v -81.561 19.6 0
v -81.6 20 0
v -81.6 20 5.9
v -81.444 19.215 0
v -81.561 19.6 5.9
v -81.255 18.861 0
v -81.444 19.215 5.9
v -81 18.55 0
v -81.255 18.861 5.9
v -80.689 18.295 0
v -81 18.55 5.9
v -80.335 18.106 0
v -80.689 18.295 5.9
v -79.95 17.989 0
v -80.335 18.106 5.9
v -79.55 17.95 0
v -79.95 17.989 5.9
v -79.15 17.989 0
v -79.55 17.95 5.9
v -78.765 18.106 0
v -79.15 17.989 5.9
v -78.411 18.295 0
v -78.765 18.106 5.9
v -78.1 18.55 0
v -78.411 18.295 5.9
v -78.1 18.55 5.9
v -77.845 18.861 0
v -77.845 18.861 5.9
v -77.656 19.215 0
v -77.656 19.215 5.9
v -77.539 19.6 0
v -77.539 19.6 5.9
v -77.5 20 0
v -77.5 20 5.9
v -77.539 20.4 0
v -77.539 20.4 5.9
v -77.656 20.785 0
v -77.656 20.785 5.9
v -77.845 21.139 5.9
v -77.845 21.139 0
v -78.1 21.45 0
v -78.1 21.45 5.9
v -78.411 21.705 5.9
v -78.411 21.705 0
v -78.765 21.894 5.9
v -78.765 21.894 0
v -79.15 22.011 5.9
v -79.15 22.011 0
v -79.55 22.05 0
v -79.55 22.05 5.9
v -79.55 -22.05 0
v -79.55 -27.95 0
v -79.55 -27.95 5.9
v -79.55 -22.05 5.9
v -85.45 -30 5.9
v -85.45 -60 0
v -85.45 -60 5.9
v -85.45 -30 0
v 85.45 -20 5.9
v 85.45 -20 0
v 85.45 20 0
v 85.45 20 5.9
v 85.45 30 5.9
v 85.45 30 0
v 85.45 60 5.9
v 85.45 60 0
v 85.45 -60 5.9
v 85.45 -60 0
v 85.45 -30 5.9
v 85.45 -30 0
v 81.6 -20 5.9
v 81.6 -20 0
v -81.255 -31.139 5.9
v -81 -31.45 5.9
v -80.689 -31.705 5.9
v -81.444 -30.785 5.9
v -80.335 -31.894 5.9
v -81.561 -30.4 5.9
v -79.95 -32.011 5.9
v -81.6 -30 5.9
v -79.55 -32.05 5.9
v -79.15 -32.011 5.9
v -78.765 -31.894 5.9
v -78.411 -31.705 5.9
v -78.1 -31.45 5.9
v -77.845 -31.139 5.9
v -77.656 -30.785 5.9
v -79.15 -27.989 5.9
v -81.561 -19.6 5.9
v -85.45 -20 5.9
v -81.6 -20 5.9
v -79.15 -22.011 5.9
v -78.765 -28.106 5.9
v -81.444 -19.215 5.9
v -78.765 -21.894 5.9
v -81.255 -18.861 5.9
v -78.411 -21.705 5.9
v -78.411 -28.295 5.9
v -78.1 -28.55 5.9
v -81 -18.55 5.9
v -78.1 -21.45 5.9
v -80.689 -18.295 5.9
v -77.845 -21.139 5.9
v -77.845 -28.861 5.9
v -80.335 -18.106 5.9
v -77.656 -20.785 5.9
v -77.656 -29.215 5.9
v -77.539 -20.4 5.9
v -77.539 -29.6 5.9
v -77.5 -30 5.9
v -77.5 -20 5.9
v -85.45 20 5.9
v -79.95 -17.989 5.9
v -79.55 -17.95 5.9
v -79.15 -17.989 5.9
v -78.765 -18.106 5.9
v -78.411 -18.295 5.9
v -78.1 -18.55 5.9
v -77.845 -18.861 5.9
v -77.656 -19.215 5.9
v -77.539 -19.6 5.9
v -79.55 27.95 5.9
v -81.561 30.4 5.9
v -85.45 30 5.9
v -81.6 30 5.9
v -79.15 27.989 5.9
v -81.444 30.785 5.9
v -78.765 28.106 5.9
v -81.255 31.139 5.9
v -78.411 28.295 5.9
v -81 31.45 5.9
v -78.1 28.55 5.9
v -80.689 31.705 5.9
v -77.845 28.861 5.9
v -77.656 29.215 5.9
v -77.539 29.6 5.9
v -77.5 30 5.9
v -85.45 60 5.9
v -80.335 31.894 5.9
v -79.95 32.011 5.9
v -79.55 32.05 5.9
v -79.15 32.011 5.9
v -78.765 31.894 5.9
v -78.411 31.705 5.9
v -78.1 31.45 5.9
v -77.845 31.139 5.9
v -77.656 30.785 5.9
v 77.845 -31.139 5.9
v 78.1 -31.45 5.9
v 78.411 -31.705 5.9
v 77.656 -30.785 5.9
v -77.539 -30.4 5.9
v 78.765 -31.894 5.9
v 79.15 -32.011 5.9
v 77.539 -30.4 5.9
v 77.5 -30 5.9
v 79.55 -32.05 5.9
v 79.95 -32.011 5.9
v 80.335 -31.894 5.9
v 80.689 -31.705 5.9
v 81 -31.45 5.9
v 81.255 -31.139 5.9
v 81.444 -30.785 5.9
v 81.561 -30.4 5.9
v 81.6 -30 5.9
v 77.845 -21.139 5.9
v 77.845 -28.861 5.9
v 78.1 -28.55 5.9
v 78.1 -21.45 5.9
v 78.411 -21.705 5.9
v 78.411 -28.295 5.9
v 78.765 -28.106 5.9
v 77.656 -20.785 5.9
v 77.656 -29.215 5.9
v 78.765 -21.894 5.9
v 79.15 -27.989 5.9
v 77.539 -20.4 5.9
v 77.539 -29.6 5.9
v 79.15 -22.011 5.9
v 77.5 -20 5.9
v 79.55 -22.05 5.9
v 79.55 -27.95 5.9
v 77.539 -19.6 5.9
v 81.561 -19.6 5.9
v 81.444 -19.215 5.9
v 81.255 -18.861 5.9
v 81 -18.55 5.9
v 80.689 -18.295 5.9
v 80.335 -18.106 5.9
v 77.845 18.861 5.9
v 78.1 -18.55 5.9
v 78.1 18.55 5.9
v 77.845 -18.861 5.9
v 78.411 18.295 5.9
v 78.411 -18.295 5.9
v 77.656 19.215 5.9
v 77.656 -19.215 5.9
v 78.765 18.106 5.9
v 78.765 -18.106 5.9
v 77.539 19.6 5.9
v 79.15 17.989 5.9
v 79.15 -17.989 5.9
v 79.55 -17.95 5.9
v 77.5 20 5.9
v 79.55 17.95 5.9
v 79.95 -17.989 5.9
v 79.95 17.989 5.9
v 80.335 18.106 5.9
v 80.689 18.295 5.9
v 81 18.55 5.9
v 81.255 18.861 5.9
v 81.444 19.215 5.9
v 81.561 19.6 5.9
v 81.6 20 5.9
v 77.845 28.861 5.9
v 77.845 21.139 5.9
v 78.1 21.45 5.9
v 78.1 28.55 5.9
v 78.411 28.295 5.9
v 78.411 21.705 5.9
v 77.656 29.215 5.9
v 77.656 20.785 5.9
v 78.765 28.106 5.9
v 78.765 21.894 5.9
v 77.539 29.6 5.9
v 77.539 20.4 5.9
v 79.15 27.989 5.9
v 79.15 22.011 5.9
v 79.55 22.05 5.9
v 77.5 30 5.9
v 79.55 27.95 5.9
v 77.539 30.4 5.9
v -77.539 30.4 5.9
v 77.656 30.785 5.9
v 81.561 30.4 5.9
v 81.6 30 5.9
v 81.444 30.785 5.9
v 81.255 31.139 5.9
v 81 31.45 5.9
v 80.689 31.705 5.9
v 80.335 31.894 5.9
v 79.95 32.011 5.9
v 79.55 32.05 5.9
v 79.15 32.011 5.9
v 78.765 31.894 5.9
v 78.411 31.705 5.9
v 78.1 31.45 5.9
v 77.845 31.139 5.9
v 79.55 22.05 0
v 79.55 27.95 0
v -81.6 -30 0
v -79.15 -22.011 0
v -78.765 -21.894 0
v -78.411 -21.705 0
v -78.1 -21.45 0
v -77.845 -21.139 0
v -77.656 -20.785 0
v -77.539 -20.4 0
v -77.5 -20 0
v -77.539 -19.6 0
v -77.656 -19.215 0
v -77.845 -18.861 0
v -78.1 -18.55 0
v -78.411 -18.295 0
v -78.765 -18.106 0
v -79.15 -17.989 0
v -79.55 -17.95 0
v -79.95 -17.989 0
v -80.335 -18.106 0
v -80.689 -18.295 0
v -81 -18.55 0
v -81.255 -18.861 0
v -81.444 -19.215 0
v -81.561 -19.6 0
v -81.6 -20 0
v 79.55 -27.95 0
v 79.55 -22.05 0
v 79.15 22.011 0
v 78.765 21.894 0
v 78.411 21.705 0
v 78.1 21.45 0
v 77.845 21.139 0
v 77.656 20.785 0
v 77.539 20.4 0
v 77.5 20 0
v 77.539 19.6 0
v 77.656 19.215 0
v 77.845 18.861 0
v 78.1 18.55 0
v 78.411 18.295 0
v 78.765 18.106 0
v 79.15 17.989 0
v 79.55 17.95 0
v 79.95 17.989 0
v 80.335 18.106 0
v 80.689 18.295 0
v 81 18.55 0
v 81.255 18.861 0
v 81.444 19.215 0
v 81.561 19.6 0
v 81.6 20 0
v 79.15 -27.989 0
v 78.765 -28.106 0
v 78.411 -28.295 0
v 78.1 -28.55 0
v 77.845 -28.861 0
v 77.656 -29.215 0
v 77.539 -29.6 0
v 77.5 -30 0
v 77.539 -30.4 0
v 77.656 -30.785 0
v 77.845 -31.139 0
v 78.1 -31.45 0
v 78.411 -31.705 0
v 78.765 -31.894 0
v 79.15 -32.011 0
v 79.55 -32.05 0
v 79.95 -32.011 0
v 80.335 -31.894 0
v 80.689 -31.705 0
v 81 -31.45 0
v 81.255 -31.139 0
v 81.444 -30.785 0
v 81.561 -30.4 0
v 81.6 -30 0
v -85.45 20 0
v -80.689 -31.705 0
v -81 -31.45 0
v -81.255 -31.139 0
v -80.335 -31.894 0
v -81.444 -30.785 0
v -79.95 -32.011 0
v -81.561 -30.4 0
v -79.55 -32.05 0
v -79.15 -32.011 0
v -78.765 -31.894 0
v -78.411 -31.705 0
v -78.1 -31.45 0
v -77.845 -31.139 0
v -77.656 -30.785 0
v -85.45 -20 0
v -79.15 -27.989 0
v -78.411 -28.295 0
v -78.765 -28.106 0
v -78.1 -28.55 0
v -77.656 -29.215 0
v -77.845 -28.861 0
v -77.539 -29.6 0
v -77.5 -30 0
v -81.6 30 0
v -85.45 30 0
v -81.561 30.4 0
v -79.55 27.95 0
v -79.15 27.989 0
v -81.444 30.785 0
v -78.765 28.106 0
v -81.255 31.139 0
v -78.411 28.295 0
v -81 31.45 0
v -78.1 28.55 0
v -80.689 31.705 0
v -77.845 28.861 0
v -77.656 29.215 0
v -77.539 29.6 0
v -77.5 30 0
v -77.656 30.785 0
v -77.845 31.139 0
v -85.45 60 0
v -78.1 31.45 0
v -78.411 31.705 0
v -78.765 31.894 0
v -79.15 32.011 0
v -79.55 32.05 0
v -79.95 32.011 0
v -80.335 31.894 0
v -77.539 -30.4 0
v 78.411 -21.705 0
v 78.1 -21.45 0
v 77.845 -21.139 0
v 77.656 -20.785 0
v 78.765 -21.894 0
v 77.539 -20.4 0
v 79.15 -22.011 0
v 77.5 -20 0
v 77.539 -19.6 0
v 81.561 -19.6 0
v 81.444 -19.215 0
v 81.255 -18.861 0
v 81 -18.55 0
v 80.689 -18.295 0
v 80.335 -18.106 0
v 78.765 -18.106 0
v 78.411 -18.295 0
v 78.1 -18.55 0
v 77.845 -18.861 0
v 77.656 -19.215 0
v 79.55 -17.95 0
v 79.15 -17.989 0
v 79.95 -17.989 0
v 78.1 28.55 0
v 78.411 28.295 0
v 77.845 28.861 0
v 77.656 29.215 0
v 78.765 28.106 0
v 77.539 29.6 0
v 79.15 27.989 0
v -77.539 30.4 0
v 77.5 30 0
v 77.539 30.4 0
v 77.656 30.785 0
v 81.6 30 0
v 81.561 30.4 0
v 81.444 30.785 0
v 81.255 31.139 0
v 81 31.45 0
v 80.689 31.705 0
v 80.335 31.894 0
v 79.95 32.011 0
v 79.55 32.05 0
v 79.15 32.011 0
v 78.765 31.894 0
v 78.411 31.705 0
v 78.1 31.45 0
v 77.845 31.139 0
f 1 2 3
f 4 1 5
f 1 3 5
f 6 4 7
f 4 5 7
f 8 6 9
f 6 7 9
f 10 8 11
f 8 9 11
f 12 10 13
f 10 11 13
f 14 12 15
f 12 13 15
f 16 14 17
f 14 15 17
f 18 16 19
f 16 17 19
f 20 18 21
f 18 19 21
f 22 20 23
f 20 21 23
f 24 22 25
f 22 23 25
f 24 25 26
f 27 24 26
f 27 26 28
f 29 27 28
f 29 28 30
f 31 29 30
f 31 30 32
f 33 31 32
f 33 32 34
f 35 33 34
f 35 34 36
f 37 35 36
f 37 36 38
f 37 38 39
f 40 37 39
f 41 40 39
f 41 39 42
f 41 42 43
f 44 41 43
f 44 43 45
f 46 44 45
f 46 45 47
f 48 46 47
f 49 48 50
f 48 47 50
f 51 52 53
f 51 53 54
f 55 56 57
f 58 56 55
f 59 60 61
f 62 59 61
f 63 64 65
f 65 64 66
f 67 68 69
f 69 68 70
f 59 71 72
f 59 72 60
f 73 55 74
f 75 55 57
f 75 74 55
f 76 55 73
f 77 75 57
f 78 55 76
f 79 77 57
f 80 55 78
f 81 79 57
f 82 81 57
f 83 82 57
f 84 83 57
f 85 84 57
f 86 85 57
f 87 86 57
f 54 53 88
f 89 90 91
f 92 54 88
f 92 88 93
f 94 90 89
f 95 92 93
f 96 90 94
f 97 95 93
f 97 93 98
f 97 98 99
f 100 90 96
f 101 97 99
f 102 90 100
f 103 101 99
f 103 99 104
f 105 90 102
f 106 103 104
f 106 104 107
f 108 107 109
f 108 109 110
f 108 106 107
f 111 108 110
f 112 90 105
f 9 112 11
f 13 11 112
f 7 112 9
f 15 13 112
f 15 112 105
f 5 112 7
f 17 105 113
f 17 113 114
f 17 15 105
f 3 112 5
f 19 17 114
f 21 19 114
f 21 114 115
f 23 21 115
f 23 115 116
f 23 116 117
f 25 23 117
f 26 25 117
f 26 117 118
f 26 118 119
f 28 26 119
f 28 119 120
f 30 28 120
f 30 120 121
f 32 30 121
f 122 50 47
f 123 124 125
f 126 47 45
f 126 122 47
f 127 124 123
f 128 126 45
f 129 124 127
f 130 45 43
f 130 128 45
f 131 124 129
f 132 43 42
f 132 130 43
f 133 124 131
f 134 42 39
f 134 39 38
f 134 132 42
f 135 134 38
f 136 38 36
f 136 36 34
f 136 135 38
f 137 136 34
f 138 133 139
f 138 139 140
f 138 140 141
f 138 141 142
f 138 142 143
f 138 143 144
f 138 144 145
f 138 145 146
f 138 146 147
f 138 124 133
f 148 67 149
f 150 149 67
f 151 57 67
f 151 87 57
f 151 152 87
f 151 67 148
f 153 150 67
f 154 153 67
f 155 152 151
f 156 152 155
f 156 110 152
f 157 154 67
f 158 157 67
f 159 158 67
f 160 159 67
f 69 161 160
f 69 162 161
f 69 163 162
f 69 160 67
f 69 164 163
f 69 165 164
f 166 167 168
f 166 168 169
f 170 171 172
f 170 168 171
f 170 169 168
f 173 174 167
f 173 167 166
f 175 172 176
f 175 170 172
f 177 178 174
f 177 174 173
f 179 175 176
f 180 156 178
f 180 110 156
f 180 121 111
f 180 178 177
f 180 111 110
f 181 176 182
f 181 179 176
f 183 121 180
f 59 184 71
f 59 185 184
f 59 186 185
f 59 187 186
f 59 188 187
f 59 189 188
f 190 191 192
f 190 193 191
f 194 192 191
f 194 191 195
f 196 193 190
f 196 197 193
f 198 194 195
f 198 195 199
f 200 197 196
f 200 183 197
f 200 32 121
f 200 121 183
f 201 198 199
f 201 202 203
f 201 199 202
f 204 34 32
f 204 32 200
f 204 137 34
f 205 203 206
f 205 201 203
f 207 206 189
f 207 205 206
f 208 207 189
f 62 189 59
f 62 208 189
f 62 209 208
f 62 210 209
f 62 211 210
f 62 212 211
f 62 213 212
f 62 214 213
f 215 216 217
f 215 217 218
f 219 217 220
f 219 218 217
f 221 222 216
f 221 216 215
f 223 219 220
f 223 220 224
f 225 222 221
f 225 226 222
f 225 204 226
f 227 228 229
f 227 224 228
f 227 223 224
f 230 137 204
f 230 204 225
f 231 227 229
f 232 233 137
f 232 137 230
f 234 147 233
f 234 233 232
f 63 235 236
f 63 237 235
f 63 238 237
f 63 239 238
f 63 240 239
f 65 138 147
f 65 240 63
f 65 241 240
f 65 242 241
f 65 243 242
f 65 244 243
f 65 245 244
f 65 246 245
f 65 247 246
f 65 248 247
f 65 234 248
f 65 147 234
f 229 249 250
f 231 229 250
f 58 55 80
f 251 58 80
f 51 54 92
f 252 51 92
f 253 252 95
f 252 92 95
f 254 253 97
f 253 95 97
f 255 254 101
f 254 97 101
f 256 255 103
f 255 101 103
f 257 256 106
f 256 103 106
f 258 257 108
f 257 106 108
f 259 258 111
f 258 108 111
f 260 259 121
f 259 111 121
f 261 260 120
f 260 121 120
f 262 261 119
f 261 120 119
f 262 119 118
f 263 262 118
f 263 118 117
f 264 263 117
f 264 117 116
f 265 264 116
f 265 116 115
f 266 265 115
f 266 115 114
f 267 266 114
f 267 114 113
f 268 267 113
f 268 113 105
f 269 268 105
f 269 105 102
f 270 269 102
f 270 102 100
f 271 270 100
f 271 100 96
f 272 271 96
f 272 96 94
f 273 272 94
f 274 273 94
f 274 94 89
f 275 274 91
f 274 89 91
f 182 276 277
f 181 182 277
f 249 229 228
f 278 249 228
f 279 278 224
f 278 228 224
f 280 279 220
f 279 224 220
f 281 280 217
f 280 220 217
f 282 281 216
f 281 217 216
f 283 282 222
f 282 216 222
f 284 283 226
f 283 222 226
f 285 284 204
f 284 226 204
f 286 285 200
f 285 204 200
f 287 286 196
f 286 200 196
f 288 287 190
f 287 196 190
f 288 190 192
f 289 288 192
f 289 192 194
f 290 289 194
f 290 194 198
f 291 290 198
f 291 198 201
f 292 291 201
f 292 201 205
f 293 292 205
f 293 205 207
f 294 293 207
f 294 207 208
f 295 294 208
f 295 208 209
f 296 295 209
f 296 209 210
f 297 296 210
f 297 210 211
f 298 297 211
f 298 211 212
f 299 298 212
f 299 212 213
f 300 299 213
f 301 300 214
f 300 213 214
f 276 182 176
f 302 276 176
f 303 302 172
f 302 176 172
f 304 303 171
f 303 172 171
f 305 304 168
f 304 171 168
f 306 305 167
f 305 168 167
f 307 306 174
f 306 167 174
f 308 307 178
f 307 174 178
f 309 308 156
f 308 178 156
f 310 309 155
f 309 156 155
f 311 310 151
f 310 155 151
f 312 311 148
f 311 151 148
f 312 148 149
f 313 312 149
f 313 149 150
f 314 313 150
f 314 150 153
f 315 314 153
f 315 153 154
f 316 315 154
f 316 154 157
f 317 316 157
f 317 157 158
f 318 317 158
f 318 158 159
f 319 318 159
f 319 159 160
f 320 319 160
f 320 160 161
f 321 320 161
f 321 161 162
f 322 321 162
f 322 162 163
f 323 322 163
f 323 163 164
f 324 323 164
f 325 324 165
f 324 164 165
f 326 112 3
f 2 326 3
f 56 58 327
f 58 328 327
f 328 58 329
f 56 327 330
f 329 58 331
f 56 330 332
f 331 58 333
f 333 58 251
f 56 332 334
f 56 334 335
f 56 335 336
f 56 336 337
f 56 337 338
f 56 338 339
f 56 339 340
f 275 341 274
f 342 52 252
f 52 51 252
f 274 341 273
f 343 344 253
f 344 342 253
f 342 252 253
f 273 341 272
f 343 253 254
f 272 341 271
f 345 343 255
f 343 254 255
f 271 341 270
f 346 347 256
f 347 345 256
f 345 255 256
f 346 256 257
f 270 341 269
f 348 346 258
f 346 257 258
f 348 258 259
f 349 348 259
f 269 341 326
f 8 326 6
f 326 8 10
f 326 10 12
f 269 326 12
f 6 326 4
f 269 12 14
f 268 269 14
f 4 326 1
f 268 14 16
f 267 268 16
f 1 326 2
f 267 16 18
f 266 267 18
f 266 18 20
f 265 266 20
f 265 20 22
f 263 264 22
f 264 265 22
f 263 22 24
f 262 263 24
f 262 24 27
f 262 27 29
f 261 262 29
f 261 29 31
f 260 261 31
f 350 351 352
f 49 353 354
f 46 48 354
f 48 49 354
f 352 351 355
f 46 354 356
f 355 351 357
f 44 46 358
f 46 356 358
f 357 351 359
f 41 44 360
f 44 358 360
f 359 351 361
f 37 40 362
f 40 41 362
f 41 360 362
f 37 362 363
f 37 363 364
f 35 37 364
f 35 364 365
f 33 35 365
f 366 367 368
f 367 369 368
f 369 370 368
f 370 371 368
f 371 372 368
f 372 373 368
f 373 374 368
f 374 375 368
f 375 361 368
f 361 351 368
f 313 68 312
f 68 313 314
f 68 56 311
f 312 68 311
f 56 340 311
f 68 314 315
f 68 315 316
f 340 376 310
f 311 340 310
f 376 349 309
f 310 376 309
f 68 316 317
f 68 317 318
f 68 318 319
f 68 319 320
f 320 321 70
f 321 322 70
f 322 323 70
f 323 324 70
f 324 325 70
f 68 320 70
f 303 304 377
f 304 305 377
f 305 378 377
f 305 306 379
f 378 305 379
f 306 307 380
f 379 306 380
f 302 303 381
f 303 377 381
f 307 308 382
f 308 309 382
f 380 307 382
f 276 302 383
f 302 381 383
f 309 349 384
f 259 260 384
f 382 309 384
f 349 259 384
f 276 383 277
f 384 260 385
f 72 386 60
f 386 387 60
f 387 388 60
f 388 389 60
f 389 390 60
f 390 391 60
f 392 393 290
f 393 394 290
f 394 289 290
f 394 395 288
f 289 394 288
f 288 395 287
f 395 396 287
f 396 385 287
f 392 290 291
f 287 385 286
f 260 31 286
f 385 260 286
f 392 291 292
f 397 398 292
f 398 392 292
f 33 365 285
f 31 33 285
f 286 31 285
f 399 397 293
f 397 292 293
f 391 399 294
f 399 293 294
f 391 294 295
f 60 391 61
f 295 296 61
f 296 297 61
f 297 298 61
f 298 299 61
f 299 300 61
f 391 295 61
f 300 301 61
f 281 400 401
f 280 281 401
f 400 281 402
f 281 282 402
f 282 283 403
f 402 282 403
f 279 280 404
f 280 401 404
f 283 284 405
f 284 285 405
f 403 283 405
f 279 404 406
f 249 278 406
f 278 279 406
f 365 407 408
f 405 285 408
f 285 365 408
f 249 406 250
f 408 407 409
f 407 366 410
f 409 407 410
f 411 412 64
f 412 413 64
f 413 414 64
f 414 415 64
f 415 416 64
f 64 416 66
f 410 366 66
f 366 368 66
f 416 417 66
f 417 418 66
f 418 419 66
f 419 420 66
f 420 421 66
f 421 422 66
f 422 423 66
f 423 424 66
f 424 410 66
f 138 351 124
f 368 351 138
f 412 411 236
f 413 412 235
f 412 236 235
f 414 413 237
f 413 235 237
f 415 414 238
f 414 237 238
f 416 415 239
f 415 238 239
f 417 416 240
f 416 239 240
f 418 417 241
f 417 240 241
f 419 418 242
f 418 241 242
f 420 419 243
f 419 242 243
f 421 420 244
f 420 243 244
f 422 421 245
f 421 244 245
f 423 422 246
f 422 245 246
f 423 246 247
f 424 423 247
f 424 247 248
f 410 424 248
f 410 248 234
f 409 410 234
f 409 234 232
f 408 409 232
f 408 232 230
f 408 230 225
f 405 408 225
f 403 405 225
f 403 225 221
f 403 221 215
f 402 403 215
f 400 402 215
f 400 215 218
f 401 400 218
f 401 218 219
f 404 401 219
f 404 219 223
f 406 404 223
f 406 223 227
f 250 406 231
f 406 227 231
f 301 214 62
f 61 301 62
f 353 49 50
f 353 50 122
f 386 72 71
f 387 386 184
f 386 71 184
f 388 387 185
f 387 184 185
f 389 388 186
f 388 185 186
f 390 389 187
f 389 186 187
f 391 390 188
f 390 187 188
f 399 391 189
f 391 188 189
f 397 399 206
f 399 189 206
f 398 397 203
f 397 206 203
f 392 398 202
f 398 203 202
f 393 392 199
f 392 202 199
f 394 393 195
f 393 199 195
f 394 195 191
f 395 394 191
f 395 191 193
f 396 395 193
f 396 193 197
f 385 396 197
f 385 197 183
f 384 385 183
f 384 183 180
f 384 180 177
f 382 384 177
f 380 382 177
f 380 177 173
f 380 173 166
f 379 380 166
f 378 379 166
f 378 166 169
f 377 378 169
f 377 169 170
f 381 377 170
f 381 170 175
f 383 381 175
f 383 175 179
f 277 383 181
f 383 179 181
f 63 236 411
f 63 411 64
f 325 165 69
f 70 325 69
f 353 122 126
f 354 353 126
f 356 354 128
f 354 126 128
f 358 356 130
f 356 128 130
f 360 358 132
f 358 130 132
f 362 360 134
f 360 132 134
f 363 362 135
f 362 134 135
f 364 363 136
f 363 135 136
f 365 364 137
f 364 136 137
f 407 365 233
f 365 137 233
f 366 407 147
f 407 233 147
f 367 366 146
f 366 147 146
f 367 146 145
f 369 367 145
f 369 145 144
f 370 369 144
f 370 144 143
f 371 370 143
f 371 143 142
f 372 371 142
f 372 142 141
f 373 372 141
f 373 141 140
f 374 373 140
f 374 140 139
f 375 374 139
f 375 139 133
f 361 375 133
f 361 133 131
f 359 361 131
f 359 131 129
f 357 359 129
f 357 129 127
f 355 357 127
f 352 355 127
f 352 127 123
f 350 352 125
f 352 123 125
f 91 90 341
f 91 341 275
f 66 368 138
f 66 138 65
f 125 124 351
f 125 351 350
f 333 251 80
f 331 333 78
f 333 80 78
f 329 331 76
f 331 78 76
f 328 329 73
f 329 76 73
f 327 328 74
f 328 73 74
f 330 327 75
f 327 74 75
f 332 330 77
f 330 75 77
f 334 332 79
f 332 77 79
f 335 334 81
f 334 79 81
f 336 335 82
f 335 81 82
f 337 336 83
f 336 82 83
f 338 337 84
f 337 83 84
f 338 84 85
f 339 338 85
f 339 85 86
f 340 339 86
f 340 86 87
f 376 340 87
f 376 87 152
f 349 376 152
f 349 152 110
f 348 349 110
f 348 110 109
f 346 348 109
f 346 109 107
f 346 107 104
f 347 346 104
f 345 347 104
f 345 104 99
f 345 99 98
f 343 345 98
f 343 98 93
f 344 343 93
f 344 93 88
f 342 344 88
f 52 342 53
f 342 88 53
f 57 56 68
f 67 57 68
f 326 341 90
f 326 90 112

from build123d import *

# Parameters (mm, degrees)
SKETCH1_W           = 170.9
SKETCH1_H           = 120
BOSS_EXTRUDE1_DEPTH = 5.9
SKETCH2_W           = 5.9
SKETCH2_H           = 10
CUT_EXTRUDE1_DEPTH  = 6.9
CUT_EXTRUDE4_REACH  = 7.9
SKETCH5_R           = 2.05


with BuildPart() as part:
    # Sketch1 → Boss-Extrude1 (new body)
    with BuildSketch(Plane.XY):
        Rectangle(SKETCH1_W, SKETCH1_H)
    extrude(amount=BOSS_EXTRUDE1_DEPTH)

    # Sketch2 → Cut-Extrude1 (cut, through all)
    with BuildSketch(Plane.XY.offset(5.9)):
        with Locations((82.5, 25)):
            Rectangle(SKETCH2_W, SKETCH2_H)
        with Locations((82.5, -25)):
            Rectangle(SKETCH2_W, SKETCH2_H)
        with Locations((-82.5, -25)):
            Rectangle(SKETCH2_W, SKETCH2_H)
        with Locations((-82.5, 25)):
            Rectangle(SKETCH2_W, SKETCH2_H)
    extrude(amount=-CUT_EXTRUDE1_DEPTH, mode=Mode.SUBTRACT)

    # Sketch5 → Cut-Extrude4 (cut, up to next)
    with BuildSketch(Plane.XY.offset(5.9), mode=Mode.PRIVATE) as cut_extrude4_sk1:
        with Locations((-79.55, 30)):
            Circle(SKETCH5_R)
    cut_extrude4_tool1 = extrude(cut_extrude4_sk1.sketch, amount=-CUT_EXTRUDE4_REACH, mode=Mode.PRIVATE) & part.part
    add(cut_extrude4_tool1.solids().sort_by_distance((-79.55, 30, 5.9))[0], mode=Mode.SUBTRACT)
    # Sketch5 → Cut-Extrude4 (cut, up to next)
    with BuildSketch(Plane.XY.offset(5.9), mode=Mode.PRIVATE) as cut_extrude4_sk2:
        with Locations((-79.55, 20)):
            Circle(SKETCH5_R)
    cut_extrude4_tool2 = extrude(cut_extrude4_sk2.sketch, amount=-CUT_EXTRUDE4_REACH, mode=Mode.PRIVATE) & part.part
    add(cut_extrude4_tool2.solids().sort_by_distance((-79.55, 20, 5.9))[0], mode=Mode.SUBTRACT)
    # Sketch5 → Cut-Extrude4 (cut, up to next)
    with BuildSketch(Plane.XY.offset(5.9), mode=Mode.PRIVATE) as cut_extrude4_sk3:
        with Locations((-79.55, -20)):
            Circle(SKETCH5_R)
    cut_extrude4_tool3 = extrude(cut_extrude4_sk3.sketch, amount=-CUT_EXTRUDE4_REACH, mode=Mode.PRIVATE) & part.part
    add(cut_extrude4_tool3.solids().sort_by_distance((-79.55, -20, 5.9))[0], mode=Mode.SUBTRACT)
    # Sketch5 → Cut-Extrude4 (cut, up to next)
    with BuildSketch(Plane.XY.offset(5.9), mode=Mode.PRIVATE) as cut_extrude4_sk4:
        with Locations((-79.55, -30)):
            Circle(SKETCH5_R)
    cut_extrude4_tool4 = extrude(cut_extrude4_sk4.sketch, amount=-CUT_EXTRUDE4_REACH, mode=Mode.PRIVATE) & part.part
    add(cut_extrude4_tool4.solids().sort_by_distance((-79.55, -30, 5.9))[0], mode=Mode.SUBTRACT)
    # Sketch5 → Cut-Extrude4 (cut, up to next)
    with BuildSketch(Plane.XY.offset(5.9), mode=Mode.PRIVATE) as cut_extrude4_sk5:
        with Locations((79.55, -20)):
            Circle(SKETCH5_R)
    cut_extrude4_tool5 = extrude(cut_extrude4_sk5.sketch, amount=-CUT_EXTRUDE4_REACH, mode=Mode.PRIVATE) & part.part
    add(cut_extrude4_tool5.solids().sort_by_distance((79.55, -20, 5.9))[0], mode=Mode.SUBTRACT)
    # Sketch5 → Cut-Extrude4 (cut, up to next)
    with BuildSketch(Plane.XY.offset(5.9), mode=Mode.PRIVATE) as cut_extrude4_sk6:
        with Locations((79.55, -30)):
            Circle(SKETCH5_R)
    cut_extrude4_tool6 = extrude(cut_extrude4_sk6.sketch, amount=-CUT_EXTRUDE4_REACH, mode=Mode.PRIVATE) & part.part
    add(cut_extrude4_tool6.solids().sort_by_distance((79.55, -30, 5.9))[0], mode=Mode.SUBTRACT)
    # Sketch5 → Cut-Extrude4 (cut, up to next)
    with BuildSketch(Plane.XY.offset(5.9), mode=Mode.PRIVATE) as cut_extrude4_sk7:
        with Locations((79.55, 20)):
            Circle(SKETCH5_R)
    cut_extrude4_tool7 = extrude(cut_extrude4_sk7.sketch, amount=-CUT_EXTRUDE4_REACH, mode=Mode.PRIVATE) & part.part
    add(cut_extrude4_tool7.solids().sort_by_distance((79.55, 20, 5.9))[0], mode=Mode.SUBTRACT)
    # Sketch5 → Cut-Extrude4 (cut, up to next)
    with BuildSketch(Plane.XY.offset(5.9), mode=Mode.PRIVATE) as cut_extrude4_sk8:
        with Locations((79.55, 30)):
            Circle(SKETCH5_R)
    cut_extrude4_tool8 = extrude(cut_extrude4_sk8.sketch, amount=-CUT_EXTRUDE4_REACH, mode=Mode.PRIVATE) & part.part
    add(cut_extrude4_tool8.solids().sort_by_distance((79.55, 30, 5.9))[0], mode=Mode.SUBTRACT)


solid = part.part
